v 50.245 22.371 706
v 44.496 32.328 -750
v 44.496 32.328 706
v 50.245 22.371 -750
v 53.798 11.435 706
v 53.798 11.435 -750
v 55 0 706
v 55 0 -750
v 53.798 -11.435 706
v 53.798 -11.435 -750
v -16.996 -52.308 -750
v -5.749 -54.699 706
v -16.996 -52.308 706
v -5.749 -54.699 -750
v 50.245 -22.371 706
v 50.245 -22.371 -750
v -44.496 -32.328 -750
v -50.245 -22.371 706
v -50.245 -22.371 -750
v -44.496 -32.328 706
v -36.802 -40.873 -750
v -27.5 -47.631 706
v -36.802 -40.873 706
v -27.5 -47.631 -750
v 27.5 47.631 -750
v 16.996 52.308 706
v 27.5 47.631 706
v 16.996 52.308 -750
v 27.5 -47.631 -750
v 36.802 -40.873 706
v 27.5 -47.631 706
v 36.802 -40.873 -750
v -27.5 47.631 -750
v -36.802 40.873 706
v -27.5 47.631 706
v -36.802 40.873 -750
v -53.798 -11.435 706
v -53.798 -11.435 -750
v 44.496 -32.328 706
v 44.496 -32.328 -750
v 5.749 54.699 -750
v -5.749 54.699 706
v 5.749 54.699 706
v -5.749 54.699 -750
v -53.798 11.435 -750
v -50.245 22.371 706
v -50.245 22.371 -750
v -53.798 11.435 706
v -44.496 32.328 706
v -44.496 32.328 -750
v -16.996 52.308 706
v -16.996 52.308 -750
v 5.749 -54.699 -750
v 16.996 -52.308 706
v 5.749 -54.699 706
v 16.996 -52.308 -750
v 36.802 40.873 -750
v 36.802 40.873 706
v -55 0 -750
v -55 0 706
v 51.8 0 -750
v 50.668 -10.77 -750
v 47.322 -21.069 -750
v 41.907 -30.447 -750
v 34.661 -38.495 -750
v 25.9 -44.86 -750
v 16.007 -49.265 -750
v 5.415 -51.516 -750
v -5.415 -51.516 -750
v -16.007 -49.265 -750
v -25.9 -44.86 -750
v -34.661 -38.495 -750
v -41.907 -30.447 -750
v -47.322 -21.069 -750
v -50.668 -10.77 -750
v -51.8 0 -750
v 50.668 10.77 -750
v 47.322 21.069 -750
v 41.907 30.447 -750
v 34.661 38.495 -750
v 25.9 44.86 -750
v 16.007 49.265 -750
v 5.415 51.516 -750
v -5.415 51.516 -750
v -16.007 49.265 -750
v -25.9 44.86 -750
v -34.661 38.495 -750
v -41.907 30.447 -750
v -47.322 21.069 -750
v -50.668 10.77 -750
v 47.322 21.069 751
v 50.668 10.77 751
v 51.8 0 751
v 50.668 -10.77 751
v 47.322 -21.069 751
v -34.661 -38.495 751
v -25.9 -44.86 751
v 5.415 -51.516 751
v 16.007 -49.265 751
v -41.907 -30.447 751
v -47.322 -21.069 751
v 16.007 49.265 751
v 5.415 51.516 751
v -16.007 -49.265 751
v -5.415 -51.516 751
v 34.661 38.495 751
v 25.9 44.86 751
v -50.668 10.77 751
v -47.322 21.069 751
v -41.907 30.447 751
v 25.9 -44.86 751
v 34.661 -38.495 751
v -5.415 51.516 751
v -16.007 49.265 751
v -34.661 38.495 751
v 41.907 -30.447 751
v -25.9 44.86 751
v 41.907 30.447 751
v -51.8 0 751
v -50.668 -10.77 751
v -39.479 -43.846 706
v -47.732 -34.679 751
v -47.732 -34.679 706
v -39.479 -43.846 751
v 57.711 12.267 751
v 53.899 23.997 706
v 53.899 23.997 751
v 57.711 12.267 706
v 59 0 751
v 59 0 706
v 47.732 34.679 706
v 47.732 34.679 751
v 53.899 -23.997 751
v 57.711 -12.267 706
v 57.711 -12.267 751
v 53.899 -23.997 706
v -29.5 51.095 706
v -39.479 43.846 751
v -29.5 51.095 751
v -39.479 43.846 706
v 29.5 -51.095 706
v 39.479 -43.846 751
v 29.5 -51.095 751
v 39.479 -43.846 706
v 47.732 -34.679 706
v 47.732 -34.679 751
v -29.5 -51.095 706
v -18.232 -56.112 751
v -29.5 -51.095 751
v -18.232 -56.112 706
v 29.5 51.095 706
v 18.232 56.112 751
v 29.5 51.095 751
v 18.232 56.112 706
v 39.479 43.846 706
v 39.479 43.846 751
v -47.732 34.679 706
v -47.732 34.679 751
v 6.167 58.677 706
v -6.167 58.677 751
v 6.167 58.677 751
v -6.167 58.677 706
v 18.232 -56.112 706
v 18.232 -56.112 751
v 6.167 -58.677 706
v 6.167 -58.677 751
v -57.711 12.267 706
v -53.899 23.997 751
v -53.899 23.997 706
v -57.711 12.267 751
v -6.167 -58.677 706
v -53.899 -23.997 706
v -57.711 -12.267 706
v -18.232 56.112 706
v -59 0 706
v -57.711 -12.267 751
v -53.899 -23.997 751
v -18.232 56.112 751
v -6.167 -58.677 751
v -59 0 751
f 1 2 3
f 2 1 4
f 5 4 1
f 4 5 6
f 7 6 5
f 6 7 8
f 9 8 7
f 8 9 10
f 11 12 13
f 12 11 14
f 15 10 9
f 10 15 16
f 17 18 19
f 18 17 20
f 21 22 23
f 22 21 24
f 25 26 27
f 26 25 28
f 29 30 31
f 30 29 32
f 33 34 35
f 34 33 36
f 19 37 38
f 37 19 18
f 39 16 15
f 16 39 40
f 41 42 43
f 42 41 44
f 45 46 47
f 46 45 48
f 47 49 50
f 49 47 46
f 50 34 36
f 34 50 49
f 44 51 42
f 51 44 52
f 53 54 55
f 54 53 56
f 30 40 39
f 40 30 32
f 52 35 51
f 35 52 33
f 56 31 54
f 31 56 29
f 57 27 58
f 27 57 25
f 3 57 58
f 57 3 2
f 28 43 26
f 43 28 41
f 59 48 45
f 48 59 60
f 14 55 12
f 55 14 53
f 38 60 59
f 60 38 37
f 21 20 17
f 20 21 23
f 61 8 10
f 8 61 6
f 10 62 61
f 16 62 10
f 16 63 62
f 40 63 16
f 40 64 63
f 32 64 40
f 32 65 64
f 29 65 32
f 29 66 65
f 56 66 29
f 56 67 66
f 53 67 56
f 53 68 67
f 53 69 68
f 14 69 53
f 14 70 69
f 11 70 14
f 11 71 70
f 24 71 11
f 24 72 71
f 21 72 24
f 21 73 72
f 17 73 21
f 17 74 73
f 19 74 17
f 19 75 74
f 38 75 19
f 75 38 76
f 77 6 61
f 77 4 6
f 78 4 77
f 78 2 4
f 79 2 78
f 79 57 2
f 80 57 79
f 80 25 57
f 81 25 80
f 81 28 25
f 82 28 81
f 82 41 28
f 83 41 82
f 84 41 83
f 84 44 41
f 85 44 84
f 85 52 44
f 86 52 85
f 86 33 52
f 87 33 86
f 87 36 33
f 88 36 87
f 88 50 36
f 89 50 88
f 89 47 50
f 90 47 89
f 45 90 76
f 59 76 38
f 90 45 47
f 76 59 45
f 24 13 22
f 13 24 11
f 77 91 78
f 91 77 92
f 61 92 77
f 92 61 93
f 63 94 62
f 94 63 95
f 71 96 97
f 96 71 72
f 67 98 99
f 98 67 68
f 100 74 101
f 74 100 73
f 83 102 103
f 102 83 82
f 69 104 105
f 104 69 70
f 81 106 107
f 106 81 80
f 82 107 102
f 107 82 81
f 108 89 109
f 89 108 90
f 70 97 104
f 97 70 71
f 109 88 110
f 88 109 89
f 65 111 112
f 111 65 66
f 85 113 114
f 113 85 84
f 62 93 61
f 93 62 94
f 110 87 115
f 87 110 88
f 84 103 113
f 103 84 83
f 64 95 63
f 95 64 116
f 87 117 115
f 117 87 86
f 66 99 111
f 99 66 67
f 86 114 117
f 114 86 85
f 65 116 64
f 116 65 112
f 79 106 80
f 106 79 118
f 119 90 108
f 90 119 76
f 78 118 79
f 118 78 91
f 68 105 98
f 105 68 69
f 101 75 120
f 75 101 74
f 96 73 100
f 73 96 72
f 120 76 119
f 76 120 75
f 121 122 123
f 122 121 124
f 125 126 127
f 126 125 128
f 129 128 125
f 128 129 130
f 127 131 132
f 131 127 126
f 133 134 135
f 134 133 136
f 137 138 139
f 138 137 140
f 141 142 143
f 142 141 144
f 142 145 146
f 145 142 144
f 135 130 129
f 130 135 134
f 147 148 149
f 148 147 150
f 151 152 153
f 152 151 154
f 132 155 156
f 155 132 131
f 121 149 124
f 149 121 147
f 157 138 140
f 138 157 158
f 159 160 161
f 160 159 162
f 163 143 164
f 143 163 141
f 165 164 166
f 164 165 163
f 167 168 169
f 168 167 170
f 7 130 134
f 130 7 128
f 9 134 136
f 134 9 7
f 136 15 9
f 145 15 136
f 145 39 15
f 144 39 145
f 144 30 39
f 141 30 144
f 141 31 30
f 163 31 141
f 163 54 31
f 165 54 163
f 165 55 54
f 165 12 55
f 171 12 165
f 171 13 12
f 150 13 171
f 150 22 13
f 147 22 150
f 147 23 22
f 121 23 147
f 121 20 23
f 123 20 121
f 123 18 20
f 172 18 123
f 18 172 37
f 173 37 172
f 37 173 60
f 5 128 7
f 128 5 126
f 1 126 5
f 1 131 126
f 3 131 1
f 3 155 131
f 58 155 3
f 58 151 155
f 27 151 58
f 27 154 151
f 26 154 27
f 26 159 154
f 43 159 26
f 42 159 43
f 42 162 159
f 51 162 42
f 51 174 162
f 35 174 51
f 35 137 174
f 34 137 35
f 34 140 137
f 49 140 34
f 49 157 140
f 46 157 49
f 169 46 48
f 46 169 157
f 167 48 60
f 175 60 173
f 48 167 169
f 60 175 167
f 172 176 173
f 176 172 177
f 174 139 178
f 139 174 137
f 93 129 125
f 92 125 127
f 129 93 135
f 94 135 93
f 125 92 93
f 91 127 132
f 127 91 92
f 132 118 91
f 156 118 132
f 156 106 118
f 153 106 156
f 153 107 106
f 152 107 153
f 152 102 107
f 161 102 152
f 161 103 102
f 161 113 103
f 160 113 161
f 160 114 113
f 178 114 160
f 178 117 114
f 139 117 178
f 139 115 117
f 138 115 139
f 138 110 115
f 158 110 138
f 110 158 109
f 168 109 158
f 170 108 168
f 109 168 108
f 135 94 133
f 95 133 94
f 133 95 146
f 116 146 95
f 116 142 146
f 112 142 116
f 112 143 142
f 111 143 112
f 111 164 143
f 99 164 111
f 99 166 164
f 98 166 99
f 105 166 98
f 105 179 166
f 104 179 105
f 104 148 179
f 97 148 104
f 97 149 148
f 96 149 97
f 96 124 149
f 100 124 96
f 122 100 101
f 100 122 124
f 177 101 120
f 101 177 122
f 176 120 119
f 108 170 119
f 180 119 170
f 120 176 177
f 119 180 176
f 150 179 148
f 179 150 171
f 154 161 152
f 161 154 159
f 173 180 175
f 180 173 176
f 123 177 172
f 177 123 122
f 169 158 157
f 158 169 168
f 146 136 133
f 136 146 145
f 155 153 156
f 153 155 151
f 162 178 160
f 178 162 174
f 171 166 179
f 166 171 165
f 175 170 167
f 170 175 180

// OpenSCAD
// Parameters
length_mm = 1500; //[750:3000:10]
ht110_outer_diameter_mm = 110; //[90:140:1]
ht110_wall_thickness_mm = 3.2; //[2:6.4:0.1]
include_end_fitting = 1; //[0:1:1]
fitting_length_mm = 45; //[20:90:1]
fitting_radial_thickness_mm = 4; //[2:10:0.5]
connect_overlap_mm = 1; //[0.5:2:0.1]

// HT Pipe Segment - complete geometry
module ht_pipe() {
  color([0.85, 0.85, 0.8]) { // Off-white for PVC
    // Main pipe segment
    difference() {
      cylinder(h=length_mm, r=ht110_outer_diameter_mm/2, center=true);
      translate([0, 0, 0])
        cylinder(h=length_mm + 2*connect_overlap_mm, r=ht110_outer_diameter_mm/2 - ht110_wall_thickness_mm, center=true);
    }
    
    // End fitting
    if (include_end_fitting) {
      difference() {
        translate([0, 0, length_mm/2 - fitting_length_mm/2 + connect_overlap_mm])
          cylinder(h=fitting_length_mm, r=ht110_outer_diameter_mm/2 + fitting_radial_thickness_mm, center=true);
        translate([0, 0, length_mm/2 - fitting_length_mm/2 + connect_overlap_mm])
          cylinder(h=fitting_length_mm + 2*connect_overlap_mm, r=ht110_outer_diameter_mm/2 - ht110_wall_thickness_mm, center=true);
      }
    }
  }
}

// Assembly
module assembly() {
  ht_pipe();
}

assembly();
